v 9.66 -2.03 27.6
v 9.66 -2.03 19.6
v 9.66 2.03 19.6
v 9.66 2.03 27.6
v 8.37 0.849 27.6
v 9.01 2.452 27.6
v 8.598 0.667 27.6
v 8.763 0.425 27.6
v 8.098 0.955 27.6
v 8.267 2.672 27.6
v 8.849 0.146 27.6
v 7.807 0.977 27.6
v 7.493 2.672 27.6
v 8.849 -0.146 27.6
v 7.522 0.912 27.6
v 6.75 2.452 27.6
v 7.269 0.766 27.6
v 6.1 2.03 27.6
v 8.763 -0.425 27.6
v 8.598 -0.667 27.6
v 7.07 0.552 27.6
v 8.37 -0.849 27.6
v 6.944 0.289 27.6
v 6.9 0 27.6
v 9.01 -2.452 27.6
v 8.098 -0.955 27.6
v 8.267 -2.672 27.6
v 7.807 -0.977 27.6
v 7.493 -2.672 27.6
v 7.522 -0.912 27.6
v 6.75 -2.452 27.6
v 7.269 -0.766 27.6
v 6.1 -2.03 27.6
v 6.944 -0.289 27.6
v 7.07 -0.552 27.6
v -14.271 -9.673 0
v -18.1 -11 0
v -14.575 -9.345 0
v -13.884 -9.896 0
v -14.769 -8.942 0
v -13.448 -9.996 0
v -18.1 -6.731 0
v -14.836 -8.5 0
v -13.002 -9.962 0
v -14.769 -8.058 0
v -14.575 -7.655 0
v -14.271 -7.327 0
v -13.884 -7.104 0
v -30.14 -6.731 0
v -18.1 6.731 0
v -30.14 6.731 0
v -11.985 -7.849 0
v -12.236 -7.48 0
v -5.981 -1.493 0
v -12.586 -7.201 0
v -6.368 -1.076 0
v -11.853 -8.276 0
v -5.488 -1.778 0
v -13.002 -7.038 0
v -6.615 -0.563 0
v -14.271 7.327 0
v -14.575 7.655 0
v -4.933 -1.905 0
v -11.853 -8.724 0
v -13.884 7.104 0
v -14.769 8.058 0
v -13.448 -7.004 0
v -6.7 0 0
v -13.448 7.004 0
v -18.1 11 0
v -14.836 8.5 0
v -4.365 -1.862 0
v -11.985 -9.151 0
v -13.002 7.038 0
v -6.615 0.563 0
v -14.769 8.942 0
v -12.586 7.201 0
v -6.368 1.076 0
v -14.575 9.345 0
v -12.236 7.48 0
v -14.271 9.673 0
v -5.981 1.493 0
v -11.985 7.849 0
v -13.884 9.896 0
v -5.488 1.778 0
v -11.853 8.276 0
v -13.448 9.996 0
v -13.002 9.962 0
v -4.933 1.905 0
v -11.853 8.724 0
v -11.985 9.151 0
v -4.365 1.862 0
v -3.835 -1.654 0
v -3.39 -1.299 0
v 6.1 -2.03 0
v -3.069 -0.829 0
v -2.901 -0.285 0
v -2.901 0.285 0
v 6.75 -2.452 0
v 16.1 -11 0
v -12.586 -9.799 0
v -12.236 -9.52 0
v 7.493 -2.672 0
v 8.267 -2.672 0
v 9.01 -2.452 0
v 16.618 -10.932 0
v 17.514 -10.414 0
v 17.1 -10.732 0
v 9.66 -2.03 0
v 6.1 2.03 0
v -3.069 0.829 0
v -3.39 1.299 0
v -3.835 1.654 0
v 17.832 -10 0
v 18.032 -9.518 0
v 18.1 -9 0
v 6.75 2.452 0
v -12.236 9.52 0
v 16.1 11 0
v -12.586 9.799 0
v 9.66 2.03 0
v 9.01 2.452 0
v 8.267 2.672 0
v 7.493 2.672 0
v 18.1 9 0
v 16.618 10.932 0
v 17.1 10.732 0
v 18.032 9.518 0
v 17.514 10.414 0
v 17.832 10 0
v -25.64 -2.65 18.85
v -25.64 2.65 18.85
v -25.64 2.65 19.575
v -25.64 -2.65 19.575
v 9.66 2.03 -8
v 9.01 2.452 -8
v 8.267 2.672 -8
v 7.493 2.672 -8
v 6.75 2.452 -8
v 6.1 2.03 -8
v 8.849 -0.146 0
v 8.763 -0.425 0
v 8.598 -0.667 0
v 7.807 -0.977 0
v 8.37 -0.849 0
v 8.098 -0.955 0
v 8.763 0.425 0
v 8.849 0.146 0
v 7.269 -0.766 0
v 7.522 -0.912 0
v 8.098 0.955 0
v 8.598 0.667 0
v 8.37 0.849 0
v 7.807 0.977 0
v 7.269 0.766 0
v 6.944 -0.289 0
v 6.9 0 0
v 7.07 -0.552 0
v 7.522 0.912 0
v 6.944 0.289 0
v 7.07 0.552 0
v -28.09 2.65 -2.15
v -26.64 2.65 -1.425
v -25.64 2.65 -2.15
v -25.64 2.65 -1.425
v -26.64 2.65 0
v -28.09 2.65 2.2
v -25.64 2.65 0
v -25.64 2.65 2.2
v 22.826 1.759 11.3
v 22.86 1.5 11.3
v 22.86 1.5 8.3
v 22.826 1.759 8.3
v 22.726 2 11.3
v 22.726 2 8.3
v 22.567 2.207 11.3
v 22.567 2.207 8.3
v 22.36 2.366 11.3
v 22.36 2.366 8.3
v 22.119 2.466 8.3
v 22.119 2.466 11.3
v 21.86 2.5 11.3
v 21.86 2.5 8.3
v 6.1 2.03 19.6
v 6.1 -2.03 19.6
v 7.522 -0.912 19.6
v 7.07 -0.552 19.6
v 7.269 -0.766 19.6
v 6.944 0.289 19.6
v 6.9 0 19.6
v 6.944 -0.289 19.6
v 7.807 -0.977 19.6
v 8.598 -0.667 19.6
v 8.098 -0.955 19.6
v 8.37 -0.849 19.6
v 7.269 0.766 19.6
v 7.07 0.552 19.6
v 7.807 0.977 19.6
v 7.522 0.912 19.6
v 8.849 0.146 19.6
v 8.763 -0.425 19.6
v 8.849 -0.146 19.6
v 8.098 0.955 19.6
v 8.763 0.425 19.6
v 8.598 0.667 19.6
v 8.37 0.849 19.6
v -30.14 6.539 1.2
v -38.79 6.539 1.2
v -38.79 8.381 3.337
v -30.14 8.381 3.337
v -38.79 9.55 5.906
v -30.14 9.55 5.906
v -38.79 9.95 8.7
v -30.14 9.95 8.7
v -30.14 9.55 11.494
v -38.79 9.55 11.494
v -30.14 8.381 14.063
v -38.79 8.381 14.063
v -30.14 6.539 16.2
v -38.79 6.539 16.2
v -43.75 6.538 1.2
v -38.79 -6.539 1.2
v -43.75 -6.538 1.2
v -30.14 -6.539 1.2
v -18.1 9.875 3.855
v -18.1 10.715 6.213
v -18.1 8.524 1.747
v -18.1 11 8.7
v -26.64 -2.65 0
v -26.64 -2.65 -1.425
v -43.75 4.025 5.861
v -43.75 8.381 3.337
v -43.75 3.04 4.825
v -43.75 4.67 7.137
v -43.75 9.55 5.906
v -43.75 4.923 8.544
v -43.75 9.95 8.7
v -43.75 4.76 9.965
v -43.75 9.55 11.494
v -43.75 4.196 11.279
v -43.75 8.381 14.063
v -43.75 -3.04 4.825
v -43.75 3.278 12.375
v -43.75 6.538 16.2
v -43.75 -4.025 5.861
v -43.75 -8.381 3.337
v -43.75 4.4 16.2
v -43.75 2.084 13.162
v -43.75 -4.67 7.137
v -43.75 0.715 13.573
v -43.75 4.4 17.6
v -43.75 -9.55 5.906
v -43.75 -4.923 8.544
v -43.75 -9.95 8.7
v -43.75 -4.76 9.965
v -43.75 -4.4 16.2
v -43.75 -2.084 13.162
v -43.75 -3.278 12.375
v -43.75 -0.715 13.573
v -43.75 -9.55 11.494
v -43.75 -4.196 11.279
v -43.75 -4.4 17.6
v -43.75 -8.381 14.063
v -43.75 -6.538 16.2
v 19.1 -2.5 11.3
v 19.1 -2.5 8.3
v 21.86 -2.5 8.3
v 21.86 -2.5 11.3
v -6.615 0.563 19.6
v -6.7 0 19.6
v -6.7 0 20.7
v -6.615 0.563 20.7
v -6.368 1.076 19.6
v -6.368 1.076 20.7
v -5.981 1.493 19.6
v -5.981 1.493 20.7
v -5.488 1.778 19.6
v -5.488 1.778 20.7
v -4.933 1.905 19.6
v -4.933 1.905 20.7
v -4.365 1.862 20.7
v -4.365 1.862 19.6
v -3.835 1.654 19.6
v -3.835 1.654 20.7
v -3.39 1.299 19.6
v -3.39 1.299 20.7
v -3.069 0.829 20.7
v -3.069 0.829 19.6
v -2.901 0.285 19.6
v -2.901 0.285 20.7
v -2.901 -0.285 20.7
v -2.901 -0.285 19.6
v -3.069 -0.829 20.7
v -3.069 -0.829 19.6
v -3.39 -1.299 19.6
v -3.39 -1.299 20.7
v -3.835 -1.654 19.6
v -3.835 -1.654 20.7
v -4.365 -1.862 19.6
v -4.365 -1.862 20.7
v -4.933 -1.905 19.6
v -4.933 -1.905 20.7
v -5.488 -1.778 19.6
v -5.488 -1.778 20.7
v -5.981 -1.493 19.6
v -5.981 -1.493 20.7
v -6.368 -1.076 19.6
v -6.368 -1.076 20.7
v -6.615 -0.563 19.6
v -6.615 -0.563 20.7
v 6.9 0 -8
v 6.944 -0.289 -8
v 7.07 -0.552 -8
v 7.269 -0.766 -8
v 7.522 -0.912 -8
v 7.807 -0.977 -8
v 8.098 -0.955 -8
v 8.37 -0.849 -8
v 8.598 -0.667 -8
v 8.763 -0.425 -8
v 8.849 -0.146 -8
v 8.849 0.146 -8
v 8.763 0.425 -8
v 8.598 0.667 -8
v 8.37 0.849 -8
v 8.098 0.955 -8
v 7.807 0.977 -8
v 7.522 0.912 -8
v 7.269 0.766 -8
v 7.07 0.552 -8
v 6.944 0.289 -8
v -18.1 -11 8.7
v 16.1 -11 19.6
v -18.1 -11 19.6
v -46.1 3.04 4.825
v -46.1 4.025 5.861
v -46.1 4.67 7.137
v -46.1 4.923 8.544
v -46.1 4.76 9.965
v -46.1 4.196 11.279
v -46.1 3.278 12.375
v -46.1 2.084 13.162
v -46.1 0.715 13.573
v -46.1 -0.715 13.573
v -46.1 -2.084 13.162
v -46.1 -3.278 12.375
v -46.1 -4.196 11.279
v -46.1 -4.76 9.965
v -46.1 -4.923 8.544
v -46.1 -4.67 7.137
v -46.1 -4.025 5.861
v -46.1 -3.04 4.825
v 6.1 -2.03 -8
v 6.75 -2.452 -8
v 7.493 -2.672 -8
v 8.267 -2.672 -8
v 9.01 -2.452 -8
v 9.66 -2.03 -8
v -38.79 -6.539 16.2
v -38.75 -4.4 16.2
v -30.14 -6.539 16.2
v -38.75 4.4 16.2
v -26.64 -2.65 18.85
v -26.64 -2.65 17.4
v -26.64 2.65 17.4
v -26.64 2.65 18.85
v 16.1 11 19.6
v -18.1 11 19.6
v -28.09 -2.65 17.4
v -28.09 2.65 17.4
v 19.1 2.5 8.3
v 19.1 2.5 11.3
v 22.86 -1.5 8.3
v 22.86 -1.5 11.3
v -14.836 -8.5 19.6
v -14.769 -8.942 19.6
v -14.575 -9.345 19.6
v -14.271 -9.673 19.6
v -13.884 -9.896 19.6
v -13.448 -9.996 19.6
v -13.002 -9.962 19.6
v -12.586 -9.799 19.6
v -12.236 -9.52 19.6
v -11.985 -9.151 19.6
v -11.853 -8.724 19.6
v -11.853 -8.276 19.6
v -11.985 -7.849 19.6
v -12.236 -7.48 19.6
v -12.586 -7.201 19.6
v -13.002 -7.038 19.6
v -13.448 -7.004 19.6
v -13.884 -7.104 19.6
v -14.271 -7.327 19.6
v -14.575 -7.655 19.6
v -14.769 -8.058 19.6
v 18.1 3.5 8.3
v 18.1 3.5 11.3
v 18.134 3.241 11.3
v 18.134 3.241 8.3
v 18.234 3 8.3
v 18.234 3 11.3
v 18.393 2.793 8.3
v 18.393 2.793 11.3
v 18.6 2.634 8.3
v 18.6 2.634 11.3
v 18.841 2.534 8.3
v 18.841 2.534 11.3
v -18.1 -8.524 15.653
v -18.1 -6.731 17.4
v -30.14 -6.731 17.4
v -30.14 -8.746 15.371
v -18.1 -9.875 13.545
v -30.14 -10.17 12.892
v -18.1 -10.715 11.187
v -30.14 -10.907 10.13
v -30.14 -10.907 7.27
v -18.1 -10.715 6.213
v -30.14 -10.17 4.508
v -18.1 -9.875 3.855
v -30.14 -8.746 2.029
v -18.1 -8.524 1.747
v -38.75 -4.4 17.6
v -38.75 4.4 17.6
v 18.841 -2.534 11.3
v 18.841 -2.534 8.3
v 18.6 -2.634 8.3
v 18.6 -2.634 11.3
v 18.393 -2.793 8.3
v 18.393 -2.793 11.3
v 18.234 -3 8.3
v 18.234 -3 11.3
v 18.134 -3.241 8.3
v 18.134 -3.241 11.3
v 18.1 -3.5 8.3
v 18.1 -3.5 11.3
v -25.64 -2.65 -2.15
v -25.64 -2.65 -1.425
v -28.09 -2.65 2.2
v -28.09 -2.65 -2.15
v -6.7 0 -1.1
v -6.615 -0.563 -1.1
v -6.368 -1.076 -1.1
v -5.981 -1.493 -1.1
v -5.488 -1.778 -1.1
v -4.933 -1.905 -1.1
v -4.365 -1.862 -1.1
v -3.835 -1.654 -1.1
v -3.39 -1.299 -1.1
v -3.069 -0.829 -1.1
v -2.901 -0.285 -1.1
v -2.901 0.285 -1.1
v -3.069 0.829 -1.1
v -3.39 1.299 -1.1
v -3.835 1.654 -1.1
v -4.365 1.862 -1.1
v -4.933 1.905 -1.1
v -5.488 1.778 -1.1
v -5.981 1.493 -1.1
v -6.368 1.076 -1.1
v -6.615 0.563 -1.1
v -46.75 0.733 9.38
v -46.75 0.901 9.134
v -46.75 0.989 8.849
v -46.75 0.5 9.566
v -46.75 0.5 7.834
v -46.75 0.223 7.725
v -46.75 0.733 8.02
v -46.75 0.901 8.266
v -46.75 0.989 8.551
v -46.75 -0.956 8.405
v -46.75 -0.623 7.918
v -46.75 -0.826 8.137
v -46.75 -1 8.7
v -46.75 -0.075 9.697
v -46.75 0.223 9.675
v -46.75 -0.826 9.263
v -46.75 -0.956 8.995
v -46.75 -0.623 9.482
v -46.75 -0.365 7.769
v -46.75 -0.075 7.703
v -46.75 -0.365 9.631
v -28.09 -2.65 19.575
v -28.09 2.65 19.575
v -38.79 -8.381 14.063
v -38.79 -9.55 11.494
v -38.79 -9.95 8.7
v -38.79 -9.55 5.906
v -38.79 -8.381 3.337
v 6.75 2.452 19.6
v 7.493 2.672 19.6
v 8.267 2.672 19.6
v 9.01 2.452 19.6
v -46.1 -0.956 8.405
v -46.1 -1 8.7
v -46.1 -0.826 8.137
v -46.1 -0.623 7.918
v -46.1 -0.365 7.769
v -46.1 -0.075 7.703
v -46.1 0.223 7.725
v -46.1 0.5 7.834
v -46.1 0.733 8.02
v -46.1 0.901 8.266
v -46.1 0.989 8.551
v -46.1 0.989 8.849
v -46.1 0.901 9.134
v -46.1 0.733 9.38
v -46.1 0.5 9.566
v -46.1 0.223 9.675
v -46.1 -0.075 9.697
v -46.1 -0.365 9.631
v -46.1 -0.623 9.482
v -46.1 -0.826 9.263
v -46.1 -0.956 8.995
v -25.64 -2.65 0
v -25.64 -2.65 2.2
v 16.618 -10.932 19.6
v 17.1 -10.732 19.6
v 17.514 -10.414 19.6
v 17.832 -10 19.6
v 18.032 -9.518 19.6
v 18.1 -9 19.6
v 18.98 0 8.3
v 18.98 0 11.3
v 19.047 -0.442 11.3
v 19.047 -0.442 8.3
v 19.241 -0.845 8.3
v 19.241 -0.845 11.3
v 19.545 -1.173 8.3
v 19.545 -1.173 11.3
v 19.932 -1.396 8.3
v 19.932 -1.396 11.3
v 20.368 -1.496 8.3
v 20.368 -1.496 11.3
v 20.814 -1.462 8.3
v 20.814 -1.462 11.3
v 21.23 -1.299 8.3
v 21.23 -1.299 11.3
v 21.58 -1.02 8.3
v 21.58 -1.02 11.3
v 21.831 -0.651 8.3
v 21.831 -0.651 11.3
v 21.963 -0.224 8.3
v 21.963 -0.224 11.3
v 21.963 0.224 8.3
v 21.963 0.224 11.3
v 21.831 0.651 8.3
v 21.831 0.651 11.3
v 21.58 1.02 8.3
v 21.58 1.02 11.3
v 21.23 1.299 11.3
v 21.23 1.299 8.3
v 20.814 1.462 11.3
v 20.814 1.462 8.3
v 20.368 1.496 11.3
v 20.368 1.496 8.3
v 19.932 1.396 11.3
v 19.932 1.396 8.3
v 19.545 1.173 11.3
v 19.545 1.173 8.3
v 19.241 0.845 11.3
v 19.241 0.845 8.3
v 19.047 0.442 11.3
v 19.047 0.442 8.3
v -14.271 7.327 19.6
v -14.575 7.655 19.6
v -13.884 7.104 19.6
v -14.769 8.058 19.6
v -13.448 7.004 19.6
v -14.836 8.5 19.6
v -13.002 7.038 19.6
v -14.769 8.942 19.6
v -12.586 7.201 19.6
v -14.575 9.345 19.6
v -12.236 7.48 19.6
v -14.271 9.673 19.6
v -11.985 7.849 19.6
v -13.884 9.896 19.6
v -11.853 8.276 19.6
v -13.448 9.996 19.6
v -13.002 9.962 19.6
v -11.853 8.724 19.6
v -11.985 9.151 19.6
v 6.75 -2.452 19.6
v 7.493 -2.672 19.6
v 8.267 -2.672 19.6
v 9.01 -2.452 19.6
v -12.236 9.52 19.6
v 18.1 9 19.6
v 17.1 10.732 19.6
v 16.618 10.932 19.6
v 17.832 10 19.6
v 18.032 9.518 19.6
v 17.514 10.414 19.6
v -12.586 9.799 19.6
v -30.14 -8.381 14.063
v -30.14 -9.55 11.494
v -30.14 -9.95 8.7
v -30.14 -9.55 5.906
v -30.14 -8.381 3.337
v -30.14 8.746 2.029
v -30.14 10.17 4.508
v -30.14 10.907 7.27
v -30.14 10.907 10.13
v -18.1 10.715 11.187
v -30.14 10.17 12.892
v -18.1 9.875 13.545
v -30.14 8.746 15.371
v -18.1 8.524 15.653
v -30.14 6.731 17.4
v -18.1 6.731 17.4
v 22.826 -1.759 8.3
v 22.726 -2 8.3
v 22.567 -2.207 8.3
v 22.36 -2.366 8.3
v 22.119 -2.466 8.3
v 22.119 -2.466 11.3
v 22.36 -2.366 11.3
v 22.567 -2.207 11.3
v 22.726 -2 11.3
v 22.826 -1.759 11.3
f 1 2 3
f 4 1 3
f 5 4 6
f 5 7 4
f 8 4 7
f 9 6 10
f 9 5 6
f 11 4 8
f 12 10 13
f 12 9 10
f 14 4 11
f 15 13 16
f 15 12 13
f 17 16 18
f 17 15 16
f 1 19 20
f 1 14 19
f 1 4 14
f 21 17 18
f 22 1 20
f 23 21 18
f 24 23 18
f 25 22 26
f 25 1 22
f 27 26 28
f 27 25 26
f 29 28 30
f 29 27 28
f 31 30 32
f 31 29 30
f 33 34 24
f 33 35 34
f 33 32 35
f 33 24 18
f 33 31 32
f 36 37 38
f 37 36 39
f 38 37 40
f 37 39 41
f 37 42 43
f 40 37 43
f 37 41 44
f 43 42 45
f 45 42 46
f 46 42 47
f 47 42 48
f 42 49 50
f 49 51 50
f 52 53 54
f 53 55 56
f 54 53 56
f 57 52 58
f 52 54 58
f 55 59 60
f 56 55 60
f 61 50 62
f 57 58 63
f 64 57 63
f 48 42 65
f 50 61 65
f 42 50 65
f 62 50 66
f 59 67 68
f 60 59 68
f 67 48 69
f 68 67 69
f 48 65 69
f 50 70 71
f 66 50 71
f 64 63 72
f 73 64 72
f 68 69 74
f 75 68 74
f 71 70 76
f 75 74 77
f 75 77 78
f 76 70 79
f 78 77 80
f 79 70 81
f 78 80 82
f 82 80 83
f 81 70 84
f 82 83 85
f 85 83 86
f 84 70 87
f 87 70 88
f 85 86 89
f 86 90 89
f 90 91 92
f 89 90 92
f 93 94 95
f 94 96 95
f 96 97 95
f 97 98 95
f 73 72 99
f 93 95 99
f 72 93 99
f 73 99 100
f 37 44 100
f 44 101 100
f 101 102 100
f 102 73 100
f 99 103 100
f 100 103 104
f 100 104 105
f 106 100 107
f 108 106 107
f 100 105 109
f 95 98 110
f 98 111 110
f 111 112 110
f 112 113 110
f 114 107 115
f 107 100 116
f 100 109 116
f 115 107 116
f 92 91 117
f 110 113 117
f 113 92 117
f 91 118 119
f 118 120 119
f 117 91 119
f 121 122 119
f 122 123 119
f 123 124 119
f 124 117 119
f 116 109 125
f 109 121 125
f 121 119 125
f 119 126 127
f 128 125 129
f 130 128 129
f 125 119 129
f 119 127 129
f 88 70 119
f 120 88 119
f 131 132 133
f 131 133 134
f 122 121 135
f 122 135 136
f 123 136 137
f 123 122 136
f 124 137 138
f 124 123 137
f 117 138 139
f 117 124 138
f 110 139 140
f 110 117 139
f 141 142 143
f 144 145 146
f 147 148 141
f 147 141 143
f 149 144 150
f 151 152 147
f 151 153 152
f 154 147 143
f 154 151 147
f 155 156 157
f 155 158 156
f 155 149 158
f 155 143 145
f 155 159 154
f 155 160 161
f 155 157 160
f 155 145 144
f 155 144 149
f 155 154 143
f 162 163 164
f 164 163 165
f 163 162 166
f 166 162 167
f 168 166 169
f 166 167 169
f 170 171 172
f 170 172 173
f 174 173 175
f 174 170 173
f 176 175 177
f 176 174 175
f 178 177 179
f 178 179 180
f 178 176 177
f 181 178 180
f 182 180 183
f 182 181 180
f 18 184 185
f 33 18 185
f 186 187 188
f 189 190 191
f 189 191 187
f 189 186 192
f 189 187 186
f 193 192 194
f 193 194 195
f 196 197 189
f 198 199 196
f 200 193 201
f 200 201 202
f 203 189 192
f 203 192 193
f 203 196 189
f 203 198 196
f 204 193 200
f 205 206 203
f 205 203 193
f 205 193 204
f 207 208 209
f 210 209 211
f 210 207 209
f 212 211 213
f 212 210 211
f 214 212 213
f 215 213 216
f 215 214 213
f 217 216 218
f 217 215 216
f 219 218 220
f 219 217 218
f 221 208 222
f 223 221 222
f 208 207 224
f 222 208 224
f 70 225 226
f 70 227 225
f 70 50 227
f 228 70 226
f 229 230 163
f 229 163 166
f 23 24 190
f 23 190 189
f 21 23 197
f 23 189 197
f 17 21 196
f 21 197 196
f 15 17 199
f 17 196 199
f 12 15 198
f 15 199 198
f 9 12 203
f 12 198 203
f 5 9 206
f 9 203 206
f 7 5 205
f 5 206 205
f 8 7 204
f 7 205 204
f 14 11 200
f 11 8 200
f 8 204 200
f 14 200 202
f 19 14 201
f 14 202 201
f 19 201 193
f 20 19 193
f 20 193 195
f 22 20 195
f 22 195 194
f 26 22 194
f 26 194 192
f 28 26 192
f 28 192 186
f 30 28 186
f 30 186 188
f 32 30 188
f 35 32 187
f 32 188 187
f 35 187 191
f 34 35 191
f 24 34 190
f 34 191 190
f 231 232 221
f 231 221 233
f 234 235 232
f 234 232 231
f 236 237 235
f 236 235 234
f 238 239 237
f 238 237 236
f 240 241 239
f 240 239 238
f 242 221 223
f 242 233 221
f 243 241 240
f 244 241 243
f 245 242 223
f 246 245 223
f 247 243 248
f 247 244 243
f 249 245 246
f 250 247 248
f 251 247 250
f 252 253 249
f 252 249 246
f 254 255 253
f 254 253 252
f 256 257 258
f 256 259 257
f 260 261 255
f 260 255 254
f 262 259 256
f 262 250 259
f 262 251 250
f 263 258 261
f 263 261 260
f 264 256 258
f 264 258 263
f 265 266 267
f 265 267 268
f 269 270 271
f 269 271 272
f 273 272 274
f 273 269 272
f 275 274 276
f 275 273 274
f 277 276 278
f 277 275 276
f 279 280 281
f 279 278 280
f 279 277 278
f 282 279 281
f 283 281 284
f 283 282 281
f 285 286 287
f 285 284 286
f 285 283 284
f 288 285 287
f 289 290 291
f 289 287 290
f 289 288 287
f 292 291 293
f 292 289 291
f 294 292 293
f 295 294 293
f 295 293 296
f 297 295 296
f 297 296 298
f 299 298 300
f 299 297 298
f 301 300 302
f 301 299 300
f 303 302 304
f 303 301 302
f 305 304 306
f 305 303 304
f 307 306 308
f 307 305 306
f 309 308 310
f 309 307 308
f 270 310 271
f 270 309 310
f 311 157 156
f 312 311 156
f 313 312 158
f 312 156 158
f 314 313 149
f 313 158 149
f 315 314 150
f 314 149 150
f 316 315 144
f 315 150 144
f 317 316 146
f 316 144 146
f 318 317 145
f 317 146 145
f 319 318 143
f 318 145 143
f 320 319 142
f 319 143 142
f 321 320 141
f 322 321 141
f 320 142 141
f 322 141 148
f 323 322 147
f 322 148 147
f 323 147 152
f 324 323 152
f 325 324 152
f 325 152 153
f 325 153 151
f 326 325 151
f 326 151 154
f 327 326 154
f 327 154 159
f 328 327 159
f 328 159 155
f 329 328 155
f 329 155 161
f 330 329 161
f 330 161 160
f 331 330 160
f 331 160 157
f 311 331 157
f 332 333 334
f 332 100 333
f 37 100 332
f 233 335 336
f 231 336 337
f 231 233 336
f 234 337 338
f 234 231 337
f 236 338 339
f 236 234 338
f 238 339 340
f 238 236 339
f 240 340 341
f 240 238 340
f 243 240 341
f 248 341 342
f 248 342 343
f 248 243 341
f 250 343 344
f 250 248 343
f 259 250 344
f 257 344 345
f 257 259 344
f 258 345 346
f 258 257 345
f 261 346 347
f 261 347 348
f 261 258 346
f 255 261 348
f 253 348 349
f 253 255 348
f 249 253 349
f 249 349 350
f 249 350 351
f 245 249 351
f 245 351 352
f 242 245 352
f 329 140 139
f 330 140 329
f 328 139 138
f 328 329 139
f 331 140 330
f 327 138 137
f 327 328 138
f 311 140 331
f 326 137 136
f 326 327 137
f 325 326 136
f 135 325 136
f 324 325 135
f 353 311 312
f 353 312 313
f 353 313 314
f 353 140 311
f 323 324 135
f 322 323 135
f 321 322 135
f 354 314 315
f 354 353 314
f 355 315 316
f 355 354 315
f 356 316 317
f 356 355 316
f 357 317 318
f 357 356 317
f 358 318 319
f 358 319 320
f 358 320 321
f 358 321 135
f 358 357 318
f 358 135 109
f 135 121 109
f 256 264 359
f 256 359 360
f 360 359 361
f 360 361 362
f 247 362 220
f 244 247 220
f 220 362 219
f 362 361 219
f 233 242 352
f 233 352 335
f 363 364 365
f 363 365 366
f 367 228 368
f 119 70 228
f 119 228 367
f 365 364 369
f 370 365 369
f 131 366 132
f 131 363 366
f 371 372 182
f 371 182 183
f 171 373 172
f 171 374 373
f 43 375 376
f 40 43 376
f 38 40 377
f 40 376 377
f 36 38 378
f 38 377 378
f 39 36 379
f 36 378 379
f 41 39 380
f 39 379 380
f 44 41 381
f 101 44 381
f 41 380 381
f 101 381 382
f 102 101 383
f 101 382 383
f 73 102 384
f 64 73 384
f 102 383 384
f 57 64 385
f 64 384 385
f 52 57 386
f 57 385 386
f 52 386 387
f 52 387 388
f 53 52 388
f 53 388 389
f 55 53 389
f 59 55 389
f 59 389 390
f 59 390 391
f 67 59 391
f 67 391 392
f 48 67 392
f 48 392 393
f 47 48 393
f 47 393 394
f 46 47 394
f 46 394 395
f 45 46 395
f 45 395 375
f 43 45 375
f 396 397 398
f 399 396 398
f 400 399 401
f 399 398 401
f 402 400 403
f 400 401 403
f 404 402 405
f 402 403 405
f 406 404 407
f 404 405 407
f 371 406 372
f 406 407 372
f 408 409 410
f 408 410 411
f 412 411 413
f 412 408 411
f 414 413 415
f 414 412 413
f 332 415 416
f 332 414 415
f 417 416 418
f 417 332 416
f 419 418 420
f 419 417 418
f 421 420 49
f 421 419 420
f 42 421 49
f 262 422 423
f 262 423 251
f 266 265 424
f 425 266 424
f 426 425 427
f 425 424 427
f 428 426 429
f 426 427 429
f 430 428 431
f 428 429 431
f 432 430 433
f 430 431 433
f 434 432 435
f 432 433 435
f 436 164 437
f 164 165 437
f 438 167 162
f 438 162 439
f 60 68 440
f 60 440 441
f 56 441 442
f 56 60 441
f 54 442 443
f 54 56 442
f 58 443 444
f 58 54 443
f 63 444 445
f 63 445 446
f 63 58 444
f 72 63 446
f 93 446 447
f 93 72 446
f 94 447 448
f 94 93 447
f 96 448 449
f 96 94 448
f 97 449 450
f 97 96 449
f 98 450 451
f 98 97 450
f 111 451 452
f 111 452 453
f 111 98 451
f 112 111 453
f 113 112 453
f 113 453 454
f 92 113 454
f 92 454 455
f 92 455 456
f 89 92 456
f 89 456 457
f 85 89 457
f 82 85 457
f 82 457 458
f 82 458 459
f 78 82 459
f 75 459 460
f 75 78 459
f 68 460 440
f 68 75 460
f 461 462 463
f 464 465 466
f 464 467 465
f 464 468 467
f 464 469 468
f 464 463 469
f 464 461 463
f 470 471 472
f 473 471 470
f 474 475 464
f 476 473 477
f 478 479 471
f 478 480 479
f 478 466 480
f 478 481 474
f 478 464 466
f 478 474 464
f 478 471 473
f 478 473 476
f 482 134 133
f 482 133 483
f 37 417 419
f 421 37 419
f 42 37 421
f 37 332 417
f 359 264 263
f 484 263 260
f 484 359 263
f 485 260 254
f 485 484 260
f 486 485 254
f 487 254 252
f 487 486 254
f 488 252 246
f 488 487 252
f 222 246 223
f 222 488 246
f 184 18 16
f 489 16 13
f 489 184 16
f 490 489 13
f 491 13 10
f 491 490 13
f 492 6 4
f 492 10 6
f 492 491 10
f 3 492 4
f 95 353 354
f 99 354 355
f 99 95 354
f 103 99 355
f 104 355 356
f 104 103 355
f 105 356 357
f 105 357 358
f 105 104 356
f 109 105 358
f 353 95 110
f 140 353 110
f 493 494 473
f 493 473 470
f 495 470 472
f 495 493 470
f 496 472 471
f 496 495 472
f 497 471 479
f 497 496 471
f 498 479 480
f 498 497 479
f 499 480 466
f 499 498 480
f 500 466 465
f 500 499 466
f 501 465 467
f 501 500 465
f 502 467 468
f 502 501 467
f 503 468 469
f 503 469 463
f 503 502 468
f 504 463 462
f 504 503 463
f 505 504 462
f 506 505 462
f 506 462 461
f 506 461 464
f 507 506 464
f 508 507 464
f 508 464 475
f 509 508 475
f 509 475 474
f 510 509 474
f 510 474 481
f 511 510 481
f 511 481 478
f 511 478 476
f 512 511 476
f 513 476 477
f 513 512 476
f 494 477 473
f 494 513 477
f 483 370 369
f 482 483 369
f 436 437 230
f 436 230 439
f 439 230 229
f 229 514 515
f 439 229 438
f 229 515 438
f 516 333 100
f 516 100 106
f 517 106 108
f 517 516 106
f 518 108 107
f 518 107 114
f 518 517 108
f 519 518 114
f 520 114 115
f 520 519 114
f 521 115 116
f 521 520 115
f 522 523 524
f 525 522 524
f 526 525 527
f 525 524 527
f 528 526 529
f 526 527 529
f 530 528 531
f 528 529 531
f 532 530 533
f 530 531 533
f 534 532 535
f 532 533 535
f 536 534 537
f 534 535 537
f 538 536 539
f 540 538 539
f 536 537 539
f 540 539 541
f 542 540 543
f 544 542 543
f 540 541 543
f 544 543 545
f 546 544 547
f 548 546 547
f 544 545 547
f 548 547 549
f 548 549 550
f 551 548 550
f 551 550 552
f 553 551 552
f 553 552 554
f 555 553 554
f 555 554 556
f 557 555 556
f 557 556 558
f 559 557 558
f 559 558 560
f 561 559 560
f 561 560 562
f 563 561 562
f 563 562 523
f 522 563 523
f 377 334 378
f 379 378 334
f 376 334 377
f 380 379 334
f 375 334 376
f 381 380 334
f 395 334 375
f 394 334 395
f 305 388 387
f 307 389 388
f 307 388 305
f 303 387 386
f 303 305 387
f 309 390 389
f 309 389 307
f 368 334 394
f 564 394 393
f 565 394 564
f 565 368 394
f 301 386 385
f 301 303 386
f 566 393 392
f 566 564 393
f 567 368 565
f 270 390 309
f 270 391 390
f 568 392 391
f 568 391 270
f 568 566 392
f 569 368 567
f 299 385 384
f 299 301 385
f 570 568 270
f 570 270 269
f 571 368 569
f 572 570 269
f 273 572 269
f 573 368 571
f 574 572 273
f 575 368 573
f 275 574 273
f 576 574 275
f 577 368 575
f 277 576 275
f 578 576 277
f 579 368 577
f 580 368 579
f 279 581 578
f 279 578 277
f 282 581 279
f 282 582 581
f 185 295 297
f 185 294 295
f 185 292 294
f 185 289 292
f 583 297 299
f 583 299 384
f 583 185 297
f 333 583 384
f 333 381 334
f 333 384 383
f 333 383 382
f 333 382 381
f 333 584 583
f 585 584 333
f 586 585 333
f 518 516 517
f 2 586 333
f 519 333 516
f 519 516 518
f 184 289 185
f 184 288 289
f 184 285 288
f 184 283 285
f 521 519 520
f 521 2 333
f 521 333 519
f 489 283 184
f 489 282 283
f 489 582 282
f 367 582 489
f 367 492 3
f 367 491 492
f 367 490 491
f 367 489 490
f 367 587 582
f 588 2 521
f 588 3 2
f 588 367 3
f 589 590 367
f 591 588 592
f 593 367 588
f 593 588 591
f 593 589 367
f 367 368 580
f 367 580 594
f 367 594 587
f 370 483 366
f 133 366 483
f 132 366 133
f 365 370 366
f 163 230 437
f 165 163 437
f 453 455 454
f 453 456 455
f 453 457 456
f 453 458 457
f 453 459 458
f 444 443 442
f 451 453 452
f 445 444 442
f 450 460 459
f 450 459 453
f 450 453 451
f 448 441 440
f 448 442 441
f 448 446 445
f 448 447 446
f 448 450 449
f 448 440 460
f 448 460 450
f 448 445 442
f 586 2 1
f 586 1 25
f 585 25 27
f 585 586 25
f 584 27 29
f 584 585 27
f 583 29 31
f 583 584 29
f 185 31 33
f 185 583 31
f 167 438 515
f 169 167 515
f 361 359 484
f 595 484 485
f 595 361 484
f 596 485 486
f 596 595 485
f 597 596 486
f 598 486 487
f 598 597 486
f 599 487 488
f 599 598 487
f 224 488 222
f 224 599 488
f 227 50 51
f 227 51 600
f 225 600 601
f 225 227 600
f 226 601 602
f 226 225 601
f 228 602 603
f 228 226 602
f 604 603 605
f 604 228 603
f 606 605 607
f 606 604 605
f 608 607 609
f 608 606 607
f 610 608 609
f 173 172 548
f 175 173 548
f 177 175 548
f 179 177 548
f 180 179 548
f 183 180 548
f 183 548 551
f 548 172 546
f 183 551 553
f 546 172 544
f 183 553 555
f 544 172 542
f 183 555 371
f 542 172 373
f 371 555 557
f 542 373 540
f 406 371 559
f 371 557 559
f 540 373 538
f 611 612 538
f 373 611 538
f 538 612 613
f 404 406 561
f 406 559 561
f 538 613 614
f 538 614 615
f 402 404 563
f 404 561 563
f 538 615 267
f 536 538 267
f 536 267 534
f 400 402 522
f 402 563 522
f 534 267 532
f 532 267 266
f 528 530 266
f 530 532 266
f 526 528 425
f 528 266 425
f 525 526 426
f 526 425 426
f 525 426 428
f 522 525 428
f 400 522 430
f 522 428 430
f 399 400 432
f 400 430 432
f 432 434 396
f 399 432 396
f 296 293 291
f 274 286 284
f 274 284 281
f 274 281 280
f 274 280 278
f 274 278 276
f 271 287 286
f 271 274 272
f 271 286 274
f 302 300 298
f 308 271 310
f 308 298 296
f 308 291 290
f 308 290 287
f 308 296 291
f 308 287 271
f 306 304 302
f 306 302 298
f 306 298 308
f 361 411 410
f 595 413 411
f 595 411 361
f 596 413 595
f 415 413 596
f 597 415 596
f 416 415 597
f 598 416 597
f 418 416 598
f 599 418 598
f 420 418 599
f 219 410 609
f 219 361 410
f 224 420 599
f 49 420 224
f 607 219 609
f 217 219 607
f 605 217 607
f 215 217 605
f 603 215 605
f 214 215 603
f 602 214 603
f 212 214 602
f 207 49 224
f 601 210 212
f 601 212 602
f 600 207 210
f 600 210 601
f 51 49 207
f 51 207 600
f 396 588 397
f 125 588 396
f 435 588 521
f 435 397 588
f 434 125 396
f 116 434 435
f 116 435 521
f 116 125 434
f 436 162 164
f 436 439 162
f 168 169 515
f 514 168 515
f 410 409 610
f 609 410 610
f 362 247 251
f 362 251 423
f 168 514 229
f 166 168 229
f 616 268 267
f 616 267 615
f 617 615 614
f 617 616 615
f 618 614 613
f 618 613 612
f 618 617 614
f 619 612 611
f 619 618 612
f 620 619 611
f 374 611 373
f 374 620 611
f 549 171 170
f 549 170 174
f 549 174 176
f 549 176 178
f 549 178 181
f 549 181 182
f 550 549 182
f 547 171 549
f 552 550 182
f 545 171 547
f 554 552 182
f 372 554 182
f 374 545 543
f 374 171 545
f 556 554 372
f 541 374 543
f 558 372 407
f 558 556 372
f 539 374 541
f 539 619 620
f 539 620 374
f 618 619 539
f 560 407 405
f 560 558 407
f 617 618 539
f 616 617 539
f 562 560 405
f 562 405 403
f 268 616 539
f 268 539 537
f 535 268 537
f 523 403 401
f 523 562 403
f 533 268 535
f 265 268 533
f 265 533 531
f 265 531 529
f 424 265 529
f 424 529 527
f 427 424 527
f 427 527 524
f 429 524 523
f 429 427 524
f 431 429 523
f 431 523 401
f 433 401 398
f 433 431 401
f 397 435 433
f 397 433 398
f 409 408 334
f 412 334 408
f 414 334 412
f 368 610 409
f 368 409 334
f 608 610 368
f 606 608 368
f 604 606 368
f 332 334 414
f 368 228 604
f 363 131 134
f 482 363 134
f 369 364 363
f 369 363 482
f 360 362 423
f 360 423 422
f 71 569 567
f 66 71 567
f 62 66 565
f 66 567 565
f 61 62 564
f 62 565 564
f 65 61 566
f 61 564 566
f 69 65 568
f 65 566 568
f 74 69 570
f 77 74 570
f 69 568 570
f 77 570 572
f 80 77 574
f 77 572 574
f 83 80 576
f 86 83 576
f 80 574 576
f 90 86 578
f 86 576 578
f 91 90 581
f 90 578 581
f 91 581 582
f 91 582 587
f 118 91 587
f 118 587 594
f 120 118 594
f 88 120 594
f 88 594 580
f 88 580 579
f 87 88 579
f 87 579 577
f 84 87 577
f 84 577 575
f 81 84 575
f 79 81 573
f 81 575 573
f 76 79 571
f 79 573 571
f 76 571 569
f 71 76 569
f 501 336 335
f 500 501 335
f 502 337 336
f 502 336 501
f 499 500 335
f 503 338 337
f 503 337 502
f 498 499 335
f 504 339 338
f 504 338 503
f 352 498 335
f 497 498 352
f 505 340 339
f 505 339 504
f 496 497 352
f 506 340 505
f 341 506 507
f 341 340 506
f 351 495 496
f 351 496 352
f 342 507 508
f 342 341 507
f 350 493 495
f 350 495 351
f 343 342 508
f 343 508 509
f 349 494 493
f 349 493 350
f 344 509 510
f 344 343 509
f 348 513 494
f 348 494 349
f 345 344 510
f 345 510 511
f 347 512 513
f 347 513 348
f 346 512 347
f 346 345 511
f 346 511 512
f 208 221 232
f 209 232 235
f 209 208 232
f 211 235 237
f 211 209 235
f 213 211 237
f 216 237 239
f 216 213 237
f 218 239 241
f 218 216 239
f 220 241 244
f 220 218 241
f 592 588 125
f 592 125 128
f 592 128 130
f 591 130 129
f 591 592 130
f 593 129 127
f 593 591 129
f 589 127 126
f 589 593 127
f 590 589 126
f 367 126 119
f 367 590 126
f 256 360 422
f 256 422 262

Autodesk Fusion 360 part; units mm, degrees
sketch "Sketch1" plane through (0, 0, 0) normal (0, 0, 1) x (1, 0, 0)
  line L0 (-18.1, 11) -> (18.1, 11)
  line L1 (18.1, 11) -> (18.1, -11)
  line L2 (18.1, -11) -> (-18.1, -11)
  line L3 (-18.1, -11) -> (-18.1, 11)
  line L4 (-18.1, 11) -> (18.1, -11) construction
  line L5 (18.1, 11) -> (-18.1, -11) construction
  dimension "d1" = 36.2
  dimension "d2" = 22
extrude "Extrude1" add sketch "Sketch1" along normal blind 19.6 makes body 1
sketch "Sketch2" plane through (0, 0, 19.6) normal (0, 0, 1) x (-1, 0, 0)
  line L0 (18.1, 11) -> (-18.1, 11)
  line L1 (-18.1, 11) -> (-18.1, -11)
  line L2 (-18.1, -11) -> (18.1, -11)
  line L3 (18.1, -11) -> (18.1, 11)
  circle A0 centre (-7.88, 0) radius 2.7
  line L4 (-6.1, 0) -> (-6.1, -2.0302)
  line L5 (-6.1, 0) -> (-6.1, 2.0302)
  line L6 (-9.66, 0) -> (-9.66, -2.0302)
  line L7 (-9.66, 2.0302) -> (-9.66, 0)
  circle A1 centre (-7.88, 0) radius 0.98
  point P0 (-7.88, 0)
  point P1 (-6.1, 0)
  point P2 (-9.66, 0)
  dimension "d6" = 3.56
  dimension "d8" = 5.4
extrude "Extrude2" add sketch "Sketch2" along normal blind 8 contours A0 L4 L5 L6 L7 bodies 1
sketch "Sketch3" plane through (0, 0, 19.6) normal (0, 0, 1) x (-1, 0, 0)
  line L0 (18.1, 11) -> (-18.1, 11)
  line L1 (-18.1, 11) -> (-18.1, -11)
  line L2 (-18.1, -11) -> (18.1, -11)
  line L3 (18.1, -11) -> (18.1, 11)
  arc A0 (-9.66, -2.0302) -> (-6.1, -2.0302) centre (-7.88, 0) ccw
  line L4 (-9.66, -2.0302) -> (-9.66, 2.0302)
  arc A1 (-6.1, 2.0302) -> (-9.66, 2.0302) centre (-7.88, 0) ccw
  line L5 (-6.1, 2.0302) -> (-6.1, -2.0302)
  circle A2 centre (4.79, 0) radius 1.91
extrude "Extrude3" add sketch "Sketch3" along normal blind 1.1 contours A2 bodies 1
mirror "Mirror1" about plane through (0, 0, 9.8) normal (0, 0, 1) of bodies 1 merged
sketch "Sketch4" plane through (0, 0, 0) normal (0, 0, -1) x (1, 0, 0)
  line L0 (18.1, 11) -> (-18.1, 11)
  line L1 (-18.1, 11) -> (-18.1, -11)
  line L2 (-18.1, -11) -> (18.1, -11)
  line L3 (18.1, -11) -> (18.1, 11)
  arc A0 (6.1, -2.0302) -> (9.66, -2.0302) centre (7.88, 0) ccw
  line L4 (6.1, -2.0302) -> (6.1, 2.0302)
  arc A1 (9.66, 2.0302) -> (6.1, 2.0302) centre (7.88, 0) ccw
  line L5 (9.66, 2.0302) -> (9.66, -2.0302)
  circle A2 centre (-4.79, 0) radius 1.91
extrude "Extrude4" cut 1 faces at (-4.2895, 0.234, 20.7) along direction (0, 0, 1) blind 1.1 on bodies 1 bodies 1
sketch "Sketch5" plane through (18.1, 0, 0) normal (1, 0, 0) x (0, 1, 0)
  line L0 (-11, 0) -> (11, 0)
  line L1 (11, 0) -> (11, 19.6)
  line L2 (11, 19.6) -> (-11, 19.6)
  line L3 (-11, 19.6) -> (-11, 0)
  line L4 (0, 0) -> (0, 9.8)
  line L5 (-2.5, 11.3) -> (2.5, 11.3)
  line L6 (2.5, 11.3) -> (2.5, 8.3)
  line L7 (2.5, 8.3) -> (-2.5, 8.3)
  line L8 (-2.5, 8.3) -> (-2.5, 11.3)
  line L9 (-2.5, 11.3) -> (2.5, 8.3) construction
  line L10 (2.5, 11.3) -> (-2.5, 8.3) construction
  point P0 (0, 9.8)
  dimension "d20" = 9.8
  dimension "d21" = 5
  dimension "d22" = 3
extrude "Extrude5" add sketch "Sketch5" along normal blind 4.76 contours L5 L6 L7 L8 bodies 1
sketch "Sketch6" plane through (0, 0, 11.3) normal (0, 0, 1) x (-1, 0, 0)
  line L0 (-18.1, -2.5) -> (-18.1, 2.5)
  line L1 (-18.1, 2.5) -> (-22.86, 2.5)
  line L2 (-22.86, 2.5) -> (-22.86, -2.5)
  line L3 (-22.86, -2.5) -> (-18.1, -2.5)
  line L4 (-22.86, 0) -> (-20.48, 0)
  circle A0 centre (-20.48, 0) radius 1.5
  dimension "d25" = 2.38
  dimension "d26" = 3
extrude "Extrude6" cut sketch "Sketch6" against normal blind 3 contours A0 bodies 1
sketch "Sketch7" plane through (0, 0, 11.3) normal (0, 0, 1) x (-1, 0, 0)
  circle A0 centre (-20.48, 0) radius 1.5
  line L0 (-18.1, -2.5) -> (-18.1, 2.5)
  line L1 (-18.1, 2.5) -> (-22.86, 2.5)
  line L2 (-22.86, 2.5) -> (-22.86, -2.5)
  line L3 (-22.86, -2.5) -> (-18.1, -2.5)
  line L4 (-22.86, -2.5) -> (-21.86, -2.5)
  line L5 (-21.86, -2.5) -> (-21.86, -1.5)
  line L6 (-21.86, -1.5) -> (-22.86, -1.5)
  line L7 (-22.86, -1.5) -> (-22.86, -2.5)
  line L8 (-22.86, 2.5) -> (-21.86, 2.5)
  line L9 (-21.86, 2.5) -> (-21.86, 1.5)
  line L10 (-21.86, 1.5) -> (-22.86, 1.5)
  line L11 (-22.86, 1.5) -> (-22.86, 2.5)
  circle A1 centre (-21.86, 1.5) radius 1
  circle A2 centre (-21.86, -1.5) radius 1
  line L12 (-18.1, -2.5) -> (-19.1, -2.5)
  line L13 (-19.1, -2.5) -> (-19.1, -3.5)
  line L14 (-19.1, -3.5) -> (-18.1, -3.5)
  line L15 (-18.1, -3.5) -> (-18.1, -2.5)
  line L16 (-18.1, 2.5) -> (-19.1, 2.5)
  line L17 (-19.1, 2.5) -> (-19.1, 3.5)
  line L18 (-19.1, 3.5) -> (-18.1, 3.5)
  line L19 (-18.1, 3.5) -> (-18.1, 2.5)
  circle A3 centre (-19.1, 3.5) radius 1
  circle A4 centre (-19.1, -3.5) radius 1
  dimension "d29" = 1
  dimension "d30" = 1
  dimension "d31" = 1
  dimension "d32" = 1
  dimension "d33" = 1
  dimension "d34" = 1
  dimension "d35" = 1
  dimension "d36" = 1
extrude "Extrude7" cut sketch "Sketch7" against normal blind 3 contours L1 L2 L8 L11 A1 | L2 L3 L4 L7 A2 | L1 L16 L19 A3 | L3 L12 L15 A4 bodies 1
sketch "Sketch8" plane through (0, 0, 11.3) normal (0, 0, 1) x (-1, 0, 0)
  circle A0 centre (-20.48, 0) radius 1.5
  arc A1 (-22.86, -1.5) -> (-21.86, -2.5) centre (-21.86, -1.5) ccw
  line L0 (-21.86, -2.5) -> (-18.1, -2.5)
  line L1 (-18.1, -2.5) -> (-18.1, 2.5)
  line L2 (-18.1, 2.5) -> (-21.86, 2.5)
  arc A2 (-21.86, 2.5) -> (-22.86, 1.5) centre (-21.86, 1.5) ccw
  line L3 (-22.86, 1.5) -> (-22.86, -1.5)
  line L4 (-18.1, -2.5) -> (-19.1, -2.5)
  line L5 (-19.1, -2.5) -> (-19.1, -3.5)
  line L6 (-19.1, -3.5) -> (-18.1, -3.5)
  line L7 (-18.1, -3.5) -> (-18.1, -2.5)
  line L8 (-18.1, 2.5) -> (-19.1, 2.5)
  line L9 (-19.1, 2.5) -> (-19.1, 3.5)
  line L10 (-19.1, 3.5) -> (-18.1, 3.5)
  line L11 (-18.1, 3.5) -> (-18.1, 2.5)
  circle A3 centre (-19.1, -3.5) radius 1
  circle A4 centre (-19.1, 3.5) radius 1
  dimension "d39" = 1
  dimension "d40" = 1
  dimension "d41" = 1
  dimension "d42" = 1
extrude "Extrude8" add sketch "Sketch8" against normal blind 3 contours L0 L4 L7 A3 | L2 L8 L11 A4 bodies 1
sketch "Sketch9" plane through (0, 0, 19.6) normal (0, 0, 1) x (-1, 0, 0)
  circle A0 centre (4.79, 0) radius 1.91
  line L0 (18.1, 11) -> (-18.1, 11)
  line L1 (-18.1, 11) -> (-18.1, -11)
  line L2 (-18.1, -11) -> (18.1, -11)
  line L3 (18.1, -11) -> (18.1, 11)
  arc A1 (-9.66, -2.0302) -> (-6.1, -2.0302) centre (-7.88, 0) ccw
  line L4 (-9.66, -2.0302) -> (-9.66, 2.0302)
  arc A2 (-6.1, 2.0302) -> (-9.66, 2.0302) centre (-7.88, 0) ccw
  line L5 (-6.1, 2.0302) -> (-6.1, -2.0302)
  line L6 (-18.1, -11) -> (-16.1, -11)
  line L7 (-16.1, -11) -> (-16.1, -9)
  line L8 (-16.1, -9) -> (-18.1, -9)
  line L9 (-18.1, -9) -> (-18.1, -11)
  line L10 (-18.1, 11) -> (-16.1, 11)
  line L11 (-16.1, 11) -> (-16.1, 9)
  line L12 (-16.1, 9) -> (-18.1, 9)
  line L13 (-18.1, 9) -> (-18.1, 11)
  circle A3 centre (-16.1, -9) radius 2
  circle A4 centre (-16.1, 9) radius 2
  dimension "d45" = 2
  dimension "d46" = 2
  dimension "d47" = 2
  dimension "d48" = 2
extrude "Extrude9" cut sketch "Sketch9" against normal blind 19.6 contours L0 L1 L10 L13 A4 | L1 L2 L6 L9 A3 bodies 1
sketch "Sketch10" plane through (-18.1, 0, 0) normal (-1, 0, 0) x (0, -1, 0)
  line L0 (-11, 0) -> (11, 0)
  line L1 (11, 0) -> (11, 19.6)
  line L2 (11, 19.6) -> (-11, 19.6)
  line L3 (-11, 19.6) -> (-11, 0)
  line L4 (0, 0) -> (-6.875, 0)
  line L5 (0, 0) -> (6.875, 0)
  line L6 (0, 0) -> (0, 17.4)
  line L7 (0, 0) -> (0, 8.7)
  line L8 (0, 17.4) -> (-6.875, 17.4)
  line L9 (0, 17.4) -> (6.875, 17.4)
  circle A0 centre (0, 8.7) radius 11
  circle A1 centre (0, 8.7) radius 10
  line L10 (0, 17.4) -> (0, 16.4)
  line L11 (0, 0) -> (0, 1)
  line L12 (0, 0) -> (0, 1)
  line L13 (0, 1) -> (7.8556, 1)
  line L14 (0, 1) -> (-7.8556, 1)
  line L15 (0, 16.4) -> (7.8556, 16.4)
  line L16 (0, 16.4) -> (-7.8556, 16.4)
  dimension "d51" = 6.875
  dimension "d52" = 6.875
  dimension "d53" = 17.4
  dimension "d54" = 8.7
  dimension "d55" = 6.875
  dimension "d56" = 6.875
  dimension "d57" = 20
  dimension "d58" = 1
  dimension "d59" = 1
extrude "Extrude10" add sketch "Sketch10" along normal blind 12.04 contours A0 A1 L14 L16 | L0 L4 A0 A1 L14 | L8 A0 A1 L16 | L0 L4 L6 L7 A1 L11 L12 L14 | L0 L5 A0 A1 L13 | L6 L8 A1 L10 L16 | L0 L5 L6 L7 A1 L11 L12 L13 | A0 A1 L13 L15 | L6 L9 A1 L10 L15 | L9 A0 A1 L15 bodies 1
extrude "Extrude11" add 1 faces at (-18.1, 3.5547, 10.9288) along direction (-1, 0, 0) blind 12.04 on bodies 1 bodies 1
sketch "Sketch11" plane through (-30.14, 0, 0) normal (-1, 0, 0) x (0, -1, 0)
  line L0 (-6.7313, 0) -> (6.7313, 0)
  arc A0 (6.7313, 0) -> (6.7313, 17.4) centre (0, 8.7) ccw
  line L1 (6.7313, 17.4) -> (-6.7313, 17.4)
  arc A1 (-6.7313, 17.4) -> (-6.7313, 0) centre (0, 8.7) ccw
  line L2 (0, 8.7) -> (-9.95, 8.7)
  line L3 (0, 8.7) -> (9.95, 8.7)
  line L4 (0, 8.7) -> (0, 16.2)
  line L5 (0, 8.7) -> (0, 1.2)
  line L6 (0, 1.2) -> (-11, 1.2)
  line L7 (-11, 1.2) -> (11, 1.2)
  line L8 (11, 1.2) -> (11, 16.2)
  line L9 (11, 16.2) -> (0, 16.2)
  line L10 (0, 16.2) -> (-11, 16.2)
  line L11 (-11, 16.2) -> (-11, 1.2)
  circle A2 centre (0, 8.7) radius 9.95
  point P0 (0, 8.7)
  dimension "d64" = 9.95
  dimension "d65" = 9.95
  dimension "d66" = 7.5
  dimension "d67" = 7.5
extrude "Extrude12" add sketch "Sketch11" along normal blind 8.65 contours L2 L5 L6 L7 A2 | L3 L5 L7 A2 | L2 L4 L10 A2 | L3 L4 L9 A2 bodies 1
sketch "Sketch12" plane through (0, 0, 16.2) normal (0, 0, 1) x (-1, 0, 0)
  line L0 (30.14, 6.5385) -> (30.14, -6.5385)
sketch "Sketch13" plane through (-38.79, 0, 0) normal (-1, 0, 0) x (0, -1, 0)
  arc A0 (6.5385, 1.2) -> (6.5385, 16.2) centre (0, 8.7) ccw
  line L0 (6.5385, 16.2) -> (-6.5385, 16.2)
  arc A1 (-6.5385, 16.2) -> (-6.5385, 1.2) centre (0, 8.7) ccw
  line L1 (-6.5385, 1.2) -> (6.5385, 1.2)
  point P0 (0, 17.65)
sketch "Sketch14" plane through (0, 0, 16.2) normal (0, 0, 1) x (-1, 0, 0)
sketch "Sketch15" plane through (-38.79, 0, 0) normal (-1, 0, 0) x (0, -1, 0)
extrude "Extrude13" add sketch "Sketch13" along normal blind 4.96 bodies 1
sketch "Sketch16" plane through (0, 0, 16.2) normal (0, 0, 1) x (-1, 0, 0)
  line L0 (30.14, 6.5385) -> (30.14, -6.5385)
  line L1 (30.14, -6.5385) -> (43.75, -6.5385)
  line L2 (43.75, -6.5385) -> (43.75, 6.5385)
  line L3 (43.75, 6.5385) -> (30.14, 6.5385)
  line L4 (43.75, 0) -> (41.25, 0)
  line L5 (43.75, -4.4) -> (38.75, -4.4)
  line L6 (38.75, -4.4) -> (38.75, 4.4)
  line L7 (38.75, 4.4) -> (43.75, 4.4)
  line L8 (43.75, 4.4) -> (43.75, -4.4)
  line L9 (43.75, -4.4) -> (38.75, 4.4) construction
  line L10 (38.75, -4.4) -> (43.75, 4.4) construction
  point P0 (41.25, 0)
  dimension "d74" = 5
  dimension "d75" = 8.8
extrude "Extrude14" add sketch "Sketch16" along normal blind 1.4 contours L2 L5 L6 L7 L8 bodies 1
sketch "Sketch17" plane through (0, 0, 20.7) normal (0, 0, 1) x (-1, 0, 0)
  circle A0 centre (4.79, 0) radius 1.91
sketch "Sketch18" plane through (-18.1, 0, 0) normal (-1, 0, 0) x (0, -1, 0)
  arc A0 (11, 8.7) -> (6.7313, 17.4) centre (0, 8.7) ccw
  line L0 (11, 8.7) -> (11, 19.6)
  line L1 (11, 19.6) -> (-11, 19.6)
  line L2 (-11, 19.6) -> (-11, 8.7)
  arc A1 (-6.7313, 17.4) -> (-11, 8.7) centre (0, 8.7) ccw
  line L3 (-6.7313, 17.4) -> (6.7313, 17.4)
sketch "Sketch19" plane through (0, 0, 17.4) normal (0, 0, 1) x (-1, 0, 0)
  line L0 (18.1, 6.7313) -> (18.1, -6.7313)
  line L1 (18.1, -6.7313) -> (30.14, -6.7313)
  line L2 (30.14, -6.7313) -> (30.14, 6.7313)
  line L3 (30.14, 6.7313) -> (18.1, 6.7313)
  line L4 (18.1, 0) -> (28.09, 0)
  line L5 (28.09, 0) -> (28.09, -2.65)
  line L6 (28.09, 0) -> (28.09, 2.65)
  line L7 (28.09, 0) -> (25.64, 0)
  line L8 (28.09, -2.65) -> (25.64, -2.65)
  line L9 (25.64, -2.65) -> (25.64, 2.65)
  line L10 (25.64, 2.65) -> (28.09, 2.65)
  line L11 (28.09, 2.65) -> (28.09, -2.65)
  dimension "d79" = 2.65
  dimension "d80" = 2.65
  dimension "d81" = 2.45
  dimension "d82" = 2.45
  dimension "d83" = 5.3
extrude "Extrude15" add sketch "Sketch19" along normal blind 2.175 separate body contours L4 L6 L7 L9 L10 L11 | L4 L5 L7 L8 L9 L11 makes body 2
mirror "Mirror2" about plane through (0, 0, 9.8) normal (0, 0, 1) of bodies 2 makes body 3
extrude "Extrude16" add 1 faces at (-26.4567, -0.8833, 0.025) along direction (0, 0, -1) blind 2.175 on bodies 3 bodies 3
sketch "Sketch20" plane through (0, -2.65, 0) normal (0, -1, 0) x (1, 0, 0)
  line L0 (-28.09, 17.4) -> (-25.64, 17.4)
  line L1 (-25.64, 17.4) -> (-25.64, 19.575)
  line L2 (-25.64, 19.575) -> (-28.09, 19.575)
  line L3 (-28.09, 19.575) -> (-28.09, 17.4)
  line L4 (-28.09, 17.4) -> (-26.64, 17.4)
  line L5 (-26.64, 17.4) -> (-26.64, 18.85)
  line L6 (-26.64, 18.85) -> (-25.64, 18.85)
  dimension "d90" = 1.45
  dimension "d91" = 1.45
extrude "Extrude17" cut sketch "Sketch20" against normal blind 6 contours L0 L1 L5 L6 bodies 2
sketch "Sketch21" plane through (0, -2.65, 0) normal (0, -1, 0) x (1, 0, 0)
  line L0 (-25.64, 2.2) -> (-28.09, 2.2)
  line L1 (-28.09, 2.2) -> (-28.09, -2.15)
  line L2 (-28.09, -2.15) -> (-25.64, -2.15)
  line L3 (-25.64, -2.15) -> (-25.64, 2.2)
  line L4 (-28.09, -0.2126) -> (-26.64, -0.2126)
  line L5 (-26.64, -0.2126) -> (-26.64, 2.2)
  line L6 (-26.64, -0.2126) -> (-26.64, -2.15)
  dimension "d94" = 1.45
sketch "Sketch22" plane through (0, -2.65, 0) normal (0, -1, 0) x (1, 0, 0)
  line L0 (-26.64, 17.4) -> (-26.64, 18.85)
  line L1 (-26.64, 18.85) -> (-25.64, 18.85)
  line L2 (-25.64, 18.85) -> (-25.64, 19.575)
  line L3 (-25.64, 19.575) -> (-28.09, 19.575)
  line L4 (-28.09, 19.575) -> (-28.09, 17.4)
  line L5 (-28.09, 17.4) -> (-26.64, 17.4)
sketch "Sketch23" plane through (0, -2.65, 0) normal (0, -1, 0) x (1, 0, 0)
  line L0 (-26.64, -2.15) -> (-26.64, -1.425)
  line L1 (-26.64, -1.425) -> (-25.6393, -1.425)
  line L2 (-25.6393, -1.425) -> (-25.6393, 0)
  line L3 (-25.6393, 0) -> (-26.64, 0)
  line L4 (-26.64, 0) -> (-25.6393, 0)
  line L5 (-25.6393, 0) -> (-25.6393, -1.425)
  line L6 (-25.6393, -1.425) -> (-26.64, -1.425)
  line L7 (-26.64, -1.425) -> (-26.64, 0)
  dimension "d95" = 0.725
extrude "Extrude18" cut sketch "Sketch23" against normal blind 6 bodies 3
sketch "Sketch24" plane through (-43.75, 0, 0) normal (-1, 0, 0) x (0, -1, 0)
  line L0 (-6.5385, 1.2) -> (6.5385, 1.2)
  arc A0 (6.5385, 1.2) -> (6.5385, 16.2) centre (0, 8.7) ccw
  line L1 (6.5385, 16.2) -> (4.4, 16.2)
  line L2 (4.4, 16.2) -> (4.4, 17.6)
  line L3 (4.4, 17.6) -> (-4.4, 17.6)
  line L4 (-4.4, 17.6) -> (-4.4, 16.2)
  line L5 (-4.4, 16.2) -> (-6.5385, 16.2)
  arc A1 (-6.5385, 16.2) -> (-6.5385, 1.2) centre (0, 8.7) ccw
  line L6 (0, 1.2) -> (0, 17.6)
  line L7 (-4.4, 16.2) -> (4.4, 16.2)
  line L8 (0, 16.2) -> (0, 8.7)
  circle A2 centre (0, 8.7) radius 4.925
  line L9 (0, 13.625) -> (0, 4.825)
  line L10 (0, 4.825) -> (-3.0397, 4.825)
  line L11 (0, 4.825) -> (3.0397, 4.825)
  dimension "d98" = 9.85
  dimension "d99" = 8.8
extrude "Extrude19" add sketch "Sketch24" along normal blind 2.35 contours L6 L8 A2 L9 L10 | L6 L8 A2 L9 L11 bodies 1
sketch "Sketch25" plane through (-46.1, 0, 0) normal (-1, 0, 0) x (0, -1, 0)
  line L0 (-3.0397, 4.825) -> (3.0397, 4.825)
  arc A0 (3.0397, 4.825) -> (-3.0397, 4.825) centre (0, 8.7) ccw
  line L1 (4.3381, 6.3684) -> (-4.3381, 11.0316)
  circle A1 centre (0, 8.7) radius 1
  dimension "d102" = 9.85
  dimension "d103" = 2
extrude "Extrude20" add sketch "Sketch25" along normal blind 0.65 contours L1 A1 | L1 A1 bodies 1
sketch "Sketch26" plane through (0, 0, 0) normal (0, 1, 0) x (1, 0, 0)
sketch "Sketch27" plane through (0, 0, 19.6) normal (0, 0, 1) x (-1, 0, 0)
  arc A0 (-16.1, 11) -> (-18.1, 9) centre (-16.1, 9) ccw
  line L0 (-18.1, 9) -> (-18.1, -9)
  arc A1 (-18.1, -9) -> (-16.1, -11) centre (-16.1, -9) ccw
  line L1 (-16.1, -11) -> (18.1, -11)
  line L2 (18.1, -11) -> (18.1, 11)
  line L3 (18.1, 11) -> (-16.1, 11)
  circle A2 centre (4.79, 0) radius 1.91
  arc A3 (-9.66, -2.0302) -> (-6.1, -2.0302) centre (-7.88, 0) ccw
  line L4 (-9.66, -2.0302) -> (-9.66, 2.0302)
  arc A4 (-6.1, 2.0302) -> (-9.66, 2.0302) centre (-7.88, 0) ccw
  line L5 (-6.1, 2.0302) -> (-6.1, -2.0302)
  line L6 (-18.104, -8.5) -> (13.336, -8.5)
  circle A5 centre (13.336, -8.5) radius 1.5
  line L7 (13.336, -8.5) -> (13.336, 8.5)
  circle A6 centre (13.336, 8.5) radius 1.5
  dimension "d107" = 31.44
  dimension "d108" = 3
  dimension "d109" = 17
  dimension "d110" = 3
extrude "Extrude21" cut sketch "Sketch27" against normal blind 20 contours A6 | L6 A5 L7 | L6 A5 L7 bodies 1
